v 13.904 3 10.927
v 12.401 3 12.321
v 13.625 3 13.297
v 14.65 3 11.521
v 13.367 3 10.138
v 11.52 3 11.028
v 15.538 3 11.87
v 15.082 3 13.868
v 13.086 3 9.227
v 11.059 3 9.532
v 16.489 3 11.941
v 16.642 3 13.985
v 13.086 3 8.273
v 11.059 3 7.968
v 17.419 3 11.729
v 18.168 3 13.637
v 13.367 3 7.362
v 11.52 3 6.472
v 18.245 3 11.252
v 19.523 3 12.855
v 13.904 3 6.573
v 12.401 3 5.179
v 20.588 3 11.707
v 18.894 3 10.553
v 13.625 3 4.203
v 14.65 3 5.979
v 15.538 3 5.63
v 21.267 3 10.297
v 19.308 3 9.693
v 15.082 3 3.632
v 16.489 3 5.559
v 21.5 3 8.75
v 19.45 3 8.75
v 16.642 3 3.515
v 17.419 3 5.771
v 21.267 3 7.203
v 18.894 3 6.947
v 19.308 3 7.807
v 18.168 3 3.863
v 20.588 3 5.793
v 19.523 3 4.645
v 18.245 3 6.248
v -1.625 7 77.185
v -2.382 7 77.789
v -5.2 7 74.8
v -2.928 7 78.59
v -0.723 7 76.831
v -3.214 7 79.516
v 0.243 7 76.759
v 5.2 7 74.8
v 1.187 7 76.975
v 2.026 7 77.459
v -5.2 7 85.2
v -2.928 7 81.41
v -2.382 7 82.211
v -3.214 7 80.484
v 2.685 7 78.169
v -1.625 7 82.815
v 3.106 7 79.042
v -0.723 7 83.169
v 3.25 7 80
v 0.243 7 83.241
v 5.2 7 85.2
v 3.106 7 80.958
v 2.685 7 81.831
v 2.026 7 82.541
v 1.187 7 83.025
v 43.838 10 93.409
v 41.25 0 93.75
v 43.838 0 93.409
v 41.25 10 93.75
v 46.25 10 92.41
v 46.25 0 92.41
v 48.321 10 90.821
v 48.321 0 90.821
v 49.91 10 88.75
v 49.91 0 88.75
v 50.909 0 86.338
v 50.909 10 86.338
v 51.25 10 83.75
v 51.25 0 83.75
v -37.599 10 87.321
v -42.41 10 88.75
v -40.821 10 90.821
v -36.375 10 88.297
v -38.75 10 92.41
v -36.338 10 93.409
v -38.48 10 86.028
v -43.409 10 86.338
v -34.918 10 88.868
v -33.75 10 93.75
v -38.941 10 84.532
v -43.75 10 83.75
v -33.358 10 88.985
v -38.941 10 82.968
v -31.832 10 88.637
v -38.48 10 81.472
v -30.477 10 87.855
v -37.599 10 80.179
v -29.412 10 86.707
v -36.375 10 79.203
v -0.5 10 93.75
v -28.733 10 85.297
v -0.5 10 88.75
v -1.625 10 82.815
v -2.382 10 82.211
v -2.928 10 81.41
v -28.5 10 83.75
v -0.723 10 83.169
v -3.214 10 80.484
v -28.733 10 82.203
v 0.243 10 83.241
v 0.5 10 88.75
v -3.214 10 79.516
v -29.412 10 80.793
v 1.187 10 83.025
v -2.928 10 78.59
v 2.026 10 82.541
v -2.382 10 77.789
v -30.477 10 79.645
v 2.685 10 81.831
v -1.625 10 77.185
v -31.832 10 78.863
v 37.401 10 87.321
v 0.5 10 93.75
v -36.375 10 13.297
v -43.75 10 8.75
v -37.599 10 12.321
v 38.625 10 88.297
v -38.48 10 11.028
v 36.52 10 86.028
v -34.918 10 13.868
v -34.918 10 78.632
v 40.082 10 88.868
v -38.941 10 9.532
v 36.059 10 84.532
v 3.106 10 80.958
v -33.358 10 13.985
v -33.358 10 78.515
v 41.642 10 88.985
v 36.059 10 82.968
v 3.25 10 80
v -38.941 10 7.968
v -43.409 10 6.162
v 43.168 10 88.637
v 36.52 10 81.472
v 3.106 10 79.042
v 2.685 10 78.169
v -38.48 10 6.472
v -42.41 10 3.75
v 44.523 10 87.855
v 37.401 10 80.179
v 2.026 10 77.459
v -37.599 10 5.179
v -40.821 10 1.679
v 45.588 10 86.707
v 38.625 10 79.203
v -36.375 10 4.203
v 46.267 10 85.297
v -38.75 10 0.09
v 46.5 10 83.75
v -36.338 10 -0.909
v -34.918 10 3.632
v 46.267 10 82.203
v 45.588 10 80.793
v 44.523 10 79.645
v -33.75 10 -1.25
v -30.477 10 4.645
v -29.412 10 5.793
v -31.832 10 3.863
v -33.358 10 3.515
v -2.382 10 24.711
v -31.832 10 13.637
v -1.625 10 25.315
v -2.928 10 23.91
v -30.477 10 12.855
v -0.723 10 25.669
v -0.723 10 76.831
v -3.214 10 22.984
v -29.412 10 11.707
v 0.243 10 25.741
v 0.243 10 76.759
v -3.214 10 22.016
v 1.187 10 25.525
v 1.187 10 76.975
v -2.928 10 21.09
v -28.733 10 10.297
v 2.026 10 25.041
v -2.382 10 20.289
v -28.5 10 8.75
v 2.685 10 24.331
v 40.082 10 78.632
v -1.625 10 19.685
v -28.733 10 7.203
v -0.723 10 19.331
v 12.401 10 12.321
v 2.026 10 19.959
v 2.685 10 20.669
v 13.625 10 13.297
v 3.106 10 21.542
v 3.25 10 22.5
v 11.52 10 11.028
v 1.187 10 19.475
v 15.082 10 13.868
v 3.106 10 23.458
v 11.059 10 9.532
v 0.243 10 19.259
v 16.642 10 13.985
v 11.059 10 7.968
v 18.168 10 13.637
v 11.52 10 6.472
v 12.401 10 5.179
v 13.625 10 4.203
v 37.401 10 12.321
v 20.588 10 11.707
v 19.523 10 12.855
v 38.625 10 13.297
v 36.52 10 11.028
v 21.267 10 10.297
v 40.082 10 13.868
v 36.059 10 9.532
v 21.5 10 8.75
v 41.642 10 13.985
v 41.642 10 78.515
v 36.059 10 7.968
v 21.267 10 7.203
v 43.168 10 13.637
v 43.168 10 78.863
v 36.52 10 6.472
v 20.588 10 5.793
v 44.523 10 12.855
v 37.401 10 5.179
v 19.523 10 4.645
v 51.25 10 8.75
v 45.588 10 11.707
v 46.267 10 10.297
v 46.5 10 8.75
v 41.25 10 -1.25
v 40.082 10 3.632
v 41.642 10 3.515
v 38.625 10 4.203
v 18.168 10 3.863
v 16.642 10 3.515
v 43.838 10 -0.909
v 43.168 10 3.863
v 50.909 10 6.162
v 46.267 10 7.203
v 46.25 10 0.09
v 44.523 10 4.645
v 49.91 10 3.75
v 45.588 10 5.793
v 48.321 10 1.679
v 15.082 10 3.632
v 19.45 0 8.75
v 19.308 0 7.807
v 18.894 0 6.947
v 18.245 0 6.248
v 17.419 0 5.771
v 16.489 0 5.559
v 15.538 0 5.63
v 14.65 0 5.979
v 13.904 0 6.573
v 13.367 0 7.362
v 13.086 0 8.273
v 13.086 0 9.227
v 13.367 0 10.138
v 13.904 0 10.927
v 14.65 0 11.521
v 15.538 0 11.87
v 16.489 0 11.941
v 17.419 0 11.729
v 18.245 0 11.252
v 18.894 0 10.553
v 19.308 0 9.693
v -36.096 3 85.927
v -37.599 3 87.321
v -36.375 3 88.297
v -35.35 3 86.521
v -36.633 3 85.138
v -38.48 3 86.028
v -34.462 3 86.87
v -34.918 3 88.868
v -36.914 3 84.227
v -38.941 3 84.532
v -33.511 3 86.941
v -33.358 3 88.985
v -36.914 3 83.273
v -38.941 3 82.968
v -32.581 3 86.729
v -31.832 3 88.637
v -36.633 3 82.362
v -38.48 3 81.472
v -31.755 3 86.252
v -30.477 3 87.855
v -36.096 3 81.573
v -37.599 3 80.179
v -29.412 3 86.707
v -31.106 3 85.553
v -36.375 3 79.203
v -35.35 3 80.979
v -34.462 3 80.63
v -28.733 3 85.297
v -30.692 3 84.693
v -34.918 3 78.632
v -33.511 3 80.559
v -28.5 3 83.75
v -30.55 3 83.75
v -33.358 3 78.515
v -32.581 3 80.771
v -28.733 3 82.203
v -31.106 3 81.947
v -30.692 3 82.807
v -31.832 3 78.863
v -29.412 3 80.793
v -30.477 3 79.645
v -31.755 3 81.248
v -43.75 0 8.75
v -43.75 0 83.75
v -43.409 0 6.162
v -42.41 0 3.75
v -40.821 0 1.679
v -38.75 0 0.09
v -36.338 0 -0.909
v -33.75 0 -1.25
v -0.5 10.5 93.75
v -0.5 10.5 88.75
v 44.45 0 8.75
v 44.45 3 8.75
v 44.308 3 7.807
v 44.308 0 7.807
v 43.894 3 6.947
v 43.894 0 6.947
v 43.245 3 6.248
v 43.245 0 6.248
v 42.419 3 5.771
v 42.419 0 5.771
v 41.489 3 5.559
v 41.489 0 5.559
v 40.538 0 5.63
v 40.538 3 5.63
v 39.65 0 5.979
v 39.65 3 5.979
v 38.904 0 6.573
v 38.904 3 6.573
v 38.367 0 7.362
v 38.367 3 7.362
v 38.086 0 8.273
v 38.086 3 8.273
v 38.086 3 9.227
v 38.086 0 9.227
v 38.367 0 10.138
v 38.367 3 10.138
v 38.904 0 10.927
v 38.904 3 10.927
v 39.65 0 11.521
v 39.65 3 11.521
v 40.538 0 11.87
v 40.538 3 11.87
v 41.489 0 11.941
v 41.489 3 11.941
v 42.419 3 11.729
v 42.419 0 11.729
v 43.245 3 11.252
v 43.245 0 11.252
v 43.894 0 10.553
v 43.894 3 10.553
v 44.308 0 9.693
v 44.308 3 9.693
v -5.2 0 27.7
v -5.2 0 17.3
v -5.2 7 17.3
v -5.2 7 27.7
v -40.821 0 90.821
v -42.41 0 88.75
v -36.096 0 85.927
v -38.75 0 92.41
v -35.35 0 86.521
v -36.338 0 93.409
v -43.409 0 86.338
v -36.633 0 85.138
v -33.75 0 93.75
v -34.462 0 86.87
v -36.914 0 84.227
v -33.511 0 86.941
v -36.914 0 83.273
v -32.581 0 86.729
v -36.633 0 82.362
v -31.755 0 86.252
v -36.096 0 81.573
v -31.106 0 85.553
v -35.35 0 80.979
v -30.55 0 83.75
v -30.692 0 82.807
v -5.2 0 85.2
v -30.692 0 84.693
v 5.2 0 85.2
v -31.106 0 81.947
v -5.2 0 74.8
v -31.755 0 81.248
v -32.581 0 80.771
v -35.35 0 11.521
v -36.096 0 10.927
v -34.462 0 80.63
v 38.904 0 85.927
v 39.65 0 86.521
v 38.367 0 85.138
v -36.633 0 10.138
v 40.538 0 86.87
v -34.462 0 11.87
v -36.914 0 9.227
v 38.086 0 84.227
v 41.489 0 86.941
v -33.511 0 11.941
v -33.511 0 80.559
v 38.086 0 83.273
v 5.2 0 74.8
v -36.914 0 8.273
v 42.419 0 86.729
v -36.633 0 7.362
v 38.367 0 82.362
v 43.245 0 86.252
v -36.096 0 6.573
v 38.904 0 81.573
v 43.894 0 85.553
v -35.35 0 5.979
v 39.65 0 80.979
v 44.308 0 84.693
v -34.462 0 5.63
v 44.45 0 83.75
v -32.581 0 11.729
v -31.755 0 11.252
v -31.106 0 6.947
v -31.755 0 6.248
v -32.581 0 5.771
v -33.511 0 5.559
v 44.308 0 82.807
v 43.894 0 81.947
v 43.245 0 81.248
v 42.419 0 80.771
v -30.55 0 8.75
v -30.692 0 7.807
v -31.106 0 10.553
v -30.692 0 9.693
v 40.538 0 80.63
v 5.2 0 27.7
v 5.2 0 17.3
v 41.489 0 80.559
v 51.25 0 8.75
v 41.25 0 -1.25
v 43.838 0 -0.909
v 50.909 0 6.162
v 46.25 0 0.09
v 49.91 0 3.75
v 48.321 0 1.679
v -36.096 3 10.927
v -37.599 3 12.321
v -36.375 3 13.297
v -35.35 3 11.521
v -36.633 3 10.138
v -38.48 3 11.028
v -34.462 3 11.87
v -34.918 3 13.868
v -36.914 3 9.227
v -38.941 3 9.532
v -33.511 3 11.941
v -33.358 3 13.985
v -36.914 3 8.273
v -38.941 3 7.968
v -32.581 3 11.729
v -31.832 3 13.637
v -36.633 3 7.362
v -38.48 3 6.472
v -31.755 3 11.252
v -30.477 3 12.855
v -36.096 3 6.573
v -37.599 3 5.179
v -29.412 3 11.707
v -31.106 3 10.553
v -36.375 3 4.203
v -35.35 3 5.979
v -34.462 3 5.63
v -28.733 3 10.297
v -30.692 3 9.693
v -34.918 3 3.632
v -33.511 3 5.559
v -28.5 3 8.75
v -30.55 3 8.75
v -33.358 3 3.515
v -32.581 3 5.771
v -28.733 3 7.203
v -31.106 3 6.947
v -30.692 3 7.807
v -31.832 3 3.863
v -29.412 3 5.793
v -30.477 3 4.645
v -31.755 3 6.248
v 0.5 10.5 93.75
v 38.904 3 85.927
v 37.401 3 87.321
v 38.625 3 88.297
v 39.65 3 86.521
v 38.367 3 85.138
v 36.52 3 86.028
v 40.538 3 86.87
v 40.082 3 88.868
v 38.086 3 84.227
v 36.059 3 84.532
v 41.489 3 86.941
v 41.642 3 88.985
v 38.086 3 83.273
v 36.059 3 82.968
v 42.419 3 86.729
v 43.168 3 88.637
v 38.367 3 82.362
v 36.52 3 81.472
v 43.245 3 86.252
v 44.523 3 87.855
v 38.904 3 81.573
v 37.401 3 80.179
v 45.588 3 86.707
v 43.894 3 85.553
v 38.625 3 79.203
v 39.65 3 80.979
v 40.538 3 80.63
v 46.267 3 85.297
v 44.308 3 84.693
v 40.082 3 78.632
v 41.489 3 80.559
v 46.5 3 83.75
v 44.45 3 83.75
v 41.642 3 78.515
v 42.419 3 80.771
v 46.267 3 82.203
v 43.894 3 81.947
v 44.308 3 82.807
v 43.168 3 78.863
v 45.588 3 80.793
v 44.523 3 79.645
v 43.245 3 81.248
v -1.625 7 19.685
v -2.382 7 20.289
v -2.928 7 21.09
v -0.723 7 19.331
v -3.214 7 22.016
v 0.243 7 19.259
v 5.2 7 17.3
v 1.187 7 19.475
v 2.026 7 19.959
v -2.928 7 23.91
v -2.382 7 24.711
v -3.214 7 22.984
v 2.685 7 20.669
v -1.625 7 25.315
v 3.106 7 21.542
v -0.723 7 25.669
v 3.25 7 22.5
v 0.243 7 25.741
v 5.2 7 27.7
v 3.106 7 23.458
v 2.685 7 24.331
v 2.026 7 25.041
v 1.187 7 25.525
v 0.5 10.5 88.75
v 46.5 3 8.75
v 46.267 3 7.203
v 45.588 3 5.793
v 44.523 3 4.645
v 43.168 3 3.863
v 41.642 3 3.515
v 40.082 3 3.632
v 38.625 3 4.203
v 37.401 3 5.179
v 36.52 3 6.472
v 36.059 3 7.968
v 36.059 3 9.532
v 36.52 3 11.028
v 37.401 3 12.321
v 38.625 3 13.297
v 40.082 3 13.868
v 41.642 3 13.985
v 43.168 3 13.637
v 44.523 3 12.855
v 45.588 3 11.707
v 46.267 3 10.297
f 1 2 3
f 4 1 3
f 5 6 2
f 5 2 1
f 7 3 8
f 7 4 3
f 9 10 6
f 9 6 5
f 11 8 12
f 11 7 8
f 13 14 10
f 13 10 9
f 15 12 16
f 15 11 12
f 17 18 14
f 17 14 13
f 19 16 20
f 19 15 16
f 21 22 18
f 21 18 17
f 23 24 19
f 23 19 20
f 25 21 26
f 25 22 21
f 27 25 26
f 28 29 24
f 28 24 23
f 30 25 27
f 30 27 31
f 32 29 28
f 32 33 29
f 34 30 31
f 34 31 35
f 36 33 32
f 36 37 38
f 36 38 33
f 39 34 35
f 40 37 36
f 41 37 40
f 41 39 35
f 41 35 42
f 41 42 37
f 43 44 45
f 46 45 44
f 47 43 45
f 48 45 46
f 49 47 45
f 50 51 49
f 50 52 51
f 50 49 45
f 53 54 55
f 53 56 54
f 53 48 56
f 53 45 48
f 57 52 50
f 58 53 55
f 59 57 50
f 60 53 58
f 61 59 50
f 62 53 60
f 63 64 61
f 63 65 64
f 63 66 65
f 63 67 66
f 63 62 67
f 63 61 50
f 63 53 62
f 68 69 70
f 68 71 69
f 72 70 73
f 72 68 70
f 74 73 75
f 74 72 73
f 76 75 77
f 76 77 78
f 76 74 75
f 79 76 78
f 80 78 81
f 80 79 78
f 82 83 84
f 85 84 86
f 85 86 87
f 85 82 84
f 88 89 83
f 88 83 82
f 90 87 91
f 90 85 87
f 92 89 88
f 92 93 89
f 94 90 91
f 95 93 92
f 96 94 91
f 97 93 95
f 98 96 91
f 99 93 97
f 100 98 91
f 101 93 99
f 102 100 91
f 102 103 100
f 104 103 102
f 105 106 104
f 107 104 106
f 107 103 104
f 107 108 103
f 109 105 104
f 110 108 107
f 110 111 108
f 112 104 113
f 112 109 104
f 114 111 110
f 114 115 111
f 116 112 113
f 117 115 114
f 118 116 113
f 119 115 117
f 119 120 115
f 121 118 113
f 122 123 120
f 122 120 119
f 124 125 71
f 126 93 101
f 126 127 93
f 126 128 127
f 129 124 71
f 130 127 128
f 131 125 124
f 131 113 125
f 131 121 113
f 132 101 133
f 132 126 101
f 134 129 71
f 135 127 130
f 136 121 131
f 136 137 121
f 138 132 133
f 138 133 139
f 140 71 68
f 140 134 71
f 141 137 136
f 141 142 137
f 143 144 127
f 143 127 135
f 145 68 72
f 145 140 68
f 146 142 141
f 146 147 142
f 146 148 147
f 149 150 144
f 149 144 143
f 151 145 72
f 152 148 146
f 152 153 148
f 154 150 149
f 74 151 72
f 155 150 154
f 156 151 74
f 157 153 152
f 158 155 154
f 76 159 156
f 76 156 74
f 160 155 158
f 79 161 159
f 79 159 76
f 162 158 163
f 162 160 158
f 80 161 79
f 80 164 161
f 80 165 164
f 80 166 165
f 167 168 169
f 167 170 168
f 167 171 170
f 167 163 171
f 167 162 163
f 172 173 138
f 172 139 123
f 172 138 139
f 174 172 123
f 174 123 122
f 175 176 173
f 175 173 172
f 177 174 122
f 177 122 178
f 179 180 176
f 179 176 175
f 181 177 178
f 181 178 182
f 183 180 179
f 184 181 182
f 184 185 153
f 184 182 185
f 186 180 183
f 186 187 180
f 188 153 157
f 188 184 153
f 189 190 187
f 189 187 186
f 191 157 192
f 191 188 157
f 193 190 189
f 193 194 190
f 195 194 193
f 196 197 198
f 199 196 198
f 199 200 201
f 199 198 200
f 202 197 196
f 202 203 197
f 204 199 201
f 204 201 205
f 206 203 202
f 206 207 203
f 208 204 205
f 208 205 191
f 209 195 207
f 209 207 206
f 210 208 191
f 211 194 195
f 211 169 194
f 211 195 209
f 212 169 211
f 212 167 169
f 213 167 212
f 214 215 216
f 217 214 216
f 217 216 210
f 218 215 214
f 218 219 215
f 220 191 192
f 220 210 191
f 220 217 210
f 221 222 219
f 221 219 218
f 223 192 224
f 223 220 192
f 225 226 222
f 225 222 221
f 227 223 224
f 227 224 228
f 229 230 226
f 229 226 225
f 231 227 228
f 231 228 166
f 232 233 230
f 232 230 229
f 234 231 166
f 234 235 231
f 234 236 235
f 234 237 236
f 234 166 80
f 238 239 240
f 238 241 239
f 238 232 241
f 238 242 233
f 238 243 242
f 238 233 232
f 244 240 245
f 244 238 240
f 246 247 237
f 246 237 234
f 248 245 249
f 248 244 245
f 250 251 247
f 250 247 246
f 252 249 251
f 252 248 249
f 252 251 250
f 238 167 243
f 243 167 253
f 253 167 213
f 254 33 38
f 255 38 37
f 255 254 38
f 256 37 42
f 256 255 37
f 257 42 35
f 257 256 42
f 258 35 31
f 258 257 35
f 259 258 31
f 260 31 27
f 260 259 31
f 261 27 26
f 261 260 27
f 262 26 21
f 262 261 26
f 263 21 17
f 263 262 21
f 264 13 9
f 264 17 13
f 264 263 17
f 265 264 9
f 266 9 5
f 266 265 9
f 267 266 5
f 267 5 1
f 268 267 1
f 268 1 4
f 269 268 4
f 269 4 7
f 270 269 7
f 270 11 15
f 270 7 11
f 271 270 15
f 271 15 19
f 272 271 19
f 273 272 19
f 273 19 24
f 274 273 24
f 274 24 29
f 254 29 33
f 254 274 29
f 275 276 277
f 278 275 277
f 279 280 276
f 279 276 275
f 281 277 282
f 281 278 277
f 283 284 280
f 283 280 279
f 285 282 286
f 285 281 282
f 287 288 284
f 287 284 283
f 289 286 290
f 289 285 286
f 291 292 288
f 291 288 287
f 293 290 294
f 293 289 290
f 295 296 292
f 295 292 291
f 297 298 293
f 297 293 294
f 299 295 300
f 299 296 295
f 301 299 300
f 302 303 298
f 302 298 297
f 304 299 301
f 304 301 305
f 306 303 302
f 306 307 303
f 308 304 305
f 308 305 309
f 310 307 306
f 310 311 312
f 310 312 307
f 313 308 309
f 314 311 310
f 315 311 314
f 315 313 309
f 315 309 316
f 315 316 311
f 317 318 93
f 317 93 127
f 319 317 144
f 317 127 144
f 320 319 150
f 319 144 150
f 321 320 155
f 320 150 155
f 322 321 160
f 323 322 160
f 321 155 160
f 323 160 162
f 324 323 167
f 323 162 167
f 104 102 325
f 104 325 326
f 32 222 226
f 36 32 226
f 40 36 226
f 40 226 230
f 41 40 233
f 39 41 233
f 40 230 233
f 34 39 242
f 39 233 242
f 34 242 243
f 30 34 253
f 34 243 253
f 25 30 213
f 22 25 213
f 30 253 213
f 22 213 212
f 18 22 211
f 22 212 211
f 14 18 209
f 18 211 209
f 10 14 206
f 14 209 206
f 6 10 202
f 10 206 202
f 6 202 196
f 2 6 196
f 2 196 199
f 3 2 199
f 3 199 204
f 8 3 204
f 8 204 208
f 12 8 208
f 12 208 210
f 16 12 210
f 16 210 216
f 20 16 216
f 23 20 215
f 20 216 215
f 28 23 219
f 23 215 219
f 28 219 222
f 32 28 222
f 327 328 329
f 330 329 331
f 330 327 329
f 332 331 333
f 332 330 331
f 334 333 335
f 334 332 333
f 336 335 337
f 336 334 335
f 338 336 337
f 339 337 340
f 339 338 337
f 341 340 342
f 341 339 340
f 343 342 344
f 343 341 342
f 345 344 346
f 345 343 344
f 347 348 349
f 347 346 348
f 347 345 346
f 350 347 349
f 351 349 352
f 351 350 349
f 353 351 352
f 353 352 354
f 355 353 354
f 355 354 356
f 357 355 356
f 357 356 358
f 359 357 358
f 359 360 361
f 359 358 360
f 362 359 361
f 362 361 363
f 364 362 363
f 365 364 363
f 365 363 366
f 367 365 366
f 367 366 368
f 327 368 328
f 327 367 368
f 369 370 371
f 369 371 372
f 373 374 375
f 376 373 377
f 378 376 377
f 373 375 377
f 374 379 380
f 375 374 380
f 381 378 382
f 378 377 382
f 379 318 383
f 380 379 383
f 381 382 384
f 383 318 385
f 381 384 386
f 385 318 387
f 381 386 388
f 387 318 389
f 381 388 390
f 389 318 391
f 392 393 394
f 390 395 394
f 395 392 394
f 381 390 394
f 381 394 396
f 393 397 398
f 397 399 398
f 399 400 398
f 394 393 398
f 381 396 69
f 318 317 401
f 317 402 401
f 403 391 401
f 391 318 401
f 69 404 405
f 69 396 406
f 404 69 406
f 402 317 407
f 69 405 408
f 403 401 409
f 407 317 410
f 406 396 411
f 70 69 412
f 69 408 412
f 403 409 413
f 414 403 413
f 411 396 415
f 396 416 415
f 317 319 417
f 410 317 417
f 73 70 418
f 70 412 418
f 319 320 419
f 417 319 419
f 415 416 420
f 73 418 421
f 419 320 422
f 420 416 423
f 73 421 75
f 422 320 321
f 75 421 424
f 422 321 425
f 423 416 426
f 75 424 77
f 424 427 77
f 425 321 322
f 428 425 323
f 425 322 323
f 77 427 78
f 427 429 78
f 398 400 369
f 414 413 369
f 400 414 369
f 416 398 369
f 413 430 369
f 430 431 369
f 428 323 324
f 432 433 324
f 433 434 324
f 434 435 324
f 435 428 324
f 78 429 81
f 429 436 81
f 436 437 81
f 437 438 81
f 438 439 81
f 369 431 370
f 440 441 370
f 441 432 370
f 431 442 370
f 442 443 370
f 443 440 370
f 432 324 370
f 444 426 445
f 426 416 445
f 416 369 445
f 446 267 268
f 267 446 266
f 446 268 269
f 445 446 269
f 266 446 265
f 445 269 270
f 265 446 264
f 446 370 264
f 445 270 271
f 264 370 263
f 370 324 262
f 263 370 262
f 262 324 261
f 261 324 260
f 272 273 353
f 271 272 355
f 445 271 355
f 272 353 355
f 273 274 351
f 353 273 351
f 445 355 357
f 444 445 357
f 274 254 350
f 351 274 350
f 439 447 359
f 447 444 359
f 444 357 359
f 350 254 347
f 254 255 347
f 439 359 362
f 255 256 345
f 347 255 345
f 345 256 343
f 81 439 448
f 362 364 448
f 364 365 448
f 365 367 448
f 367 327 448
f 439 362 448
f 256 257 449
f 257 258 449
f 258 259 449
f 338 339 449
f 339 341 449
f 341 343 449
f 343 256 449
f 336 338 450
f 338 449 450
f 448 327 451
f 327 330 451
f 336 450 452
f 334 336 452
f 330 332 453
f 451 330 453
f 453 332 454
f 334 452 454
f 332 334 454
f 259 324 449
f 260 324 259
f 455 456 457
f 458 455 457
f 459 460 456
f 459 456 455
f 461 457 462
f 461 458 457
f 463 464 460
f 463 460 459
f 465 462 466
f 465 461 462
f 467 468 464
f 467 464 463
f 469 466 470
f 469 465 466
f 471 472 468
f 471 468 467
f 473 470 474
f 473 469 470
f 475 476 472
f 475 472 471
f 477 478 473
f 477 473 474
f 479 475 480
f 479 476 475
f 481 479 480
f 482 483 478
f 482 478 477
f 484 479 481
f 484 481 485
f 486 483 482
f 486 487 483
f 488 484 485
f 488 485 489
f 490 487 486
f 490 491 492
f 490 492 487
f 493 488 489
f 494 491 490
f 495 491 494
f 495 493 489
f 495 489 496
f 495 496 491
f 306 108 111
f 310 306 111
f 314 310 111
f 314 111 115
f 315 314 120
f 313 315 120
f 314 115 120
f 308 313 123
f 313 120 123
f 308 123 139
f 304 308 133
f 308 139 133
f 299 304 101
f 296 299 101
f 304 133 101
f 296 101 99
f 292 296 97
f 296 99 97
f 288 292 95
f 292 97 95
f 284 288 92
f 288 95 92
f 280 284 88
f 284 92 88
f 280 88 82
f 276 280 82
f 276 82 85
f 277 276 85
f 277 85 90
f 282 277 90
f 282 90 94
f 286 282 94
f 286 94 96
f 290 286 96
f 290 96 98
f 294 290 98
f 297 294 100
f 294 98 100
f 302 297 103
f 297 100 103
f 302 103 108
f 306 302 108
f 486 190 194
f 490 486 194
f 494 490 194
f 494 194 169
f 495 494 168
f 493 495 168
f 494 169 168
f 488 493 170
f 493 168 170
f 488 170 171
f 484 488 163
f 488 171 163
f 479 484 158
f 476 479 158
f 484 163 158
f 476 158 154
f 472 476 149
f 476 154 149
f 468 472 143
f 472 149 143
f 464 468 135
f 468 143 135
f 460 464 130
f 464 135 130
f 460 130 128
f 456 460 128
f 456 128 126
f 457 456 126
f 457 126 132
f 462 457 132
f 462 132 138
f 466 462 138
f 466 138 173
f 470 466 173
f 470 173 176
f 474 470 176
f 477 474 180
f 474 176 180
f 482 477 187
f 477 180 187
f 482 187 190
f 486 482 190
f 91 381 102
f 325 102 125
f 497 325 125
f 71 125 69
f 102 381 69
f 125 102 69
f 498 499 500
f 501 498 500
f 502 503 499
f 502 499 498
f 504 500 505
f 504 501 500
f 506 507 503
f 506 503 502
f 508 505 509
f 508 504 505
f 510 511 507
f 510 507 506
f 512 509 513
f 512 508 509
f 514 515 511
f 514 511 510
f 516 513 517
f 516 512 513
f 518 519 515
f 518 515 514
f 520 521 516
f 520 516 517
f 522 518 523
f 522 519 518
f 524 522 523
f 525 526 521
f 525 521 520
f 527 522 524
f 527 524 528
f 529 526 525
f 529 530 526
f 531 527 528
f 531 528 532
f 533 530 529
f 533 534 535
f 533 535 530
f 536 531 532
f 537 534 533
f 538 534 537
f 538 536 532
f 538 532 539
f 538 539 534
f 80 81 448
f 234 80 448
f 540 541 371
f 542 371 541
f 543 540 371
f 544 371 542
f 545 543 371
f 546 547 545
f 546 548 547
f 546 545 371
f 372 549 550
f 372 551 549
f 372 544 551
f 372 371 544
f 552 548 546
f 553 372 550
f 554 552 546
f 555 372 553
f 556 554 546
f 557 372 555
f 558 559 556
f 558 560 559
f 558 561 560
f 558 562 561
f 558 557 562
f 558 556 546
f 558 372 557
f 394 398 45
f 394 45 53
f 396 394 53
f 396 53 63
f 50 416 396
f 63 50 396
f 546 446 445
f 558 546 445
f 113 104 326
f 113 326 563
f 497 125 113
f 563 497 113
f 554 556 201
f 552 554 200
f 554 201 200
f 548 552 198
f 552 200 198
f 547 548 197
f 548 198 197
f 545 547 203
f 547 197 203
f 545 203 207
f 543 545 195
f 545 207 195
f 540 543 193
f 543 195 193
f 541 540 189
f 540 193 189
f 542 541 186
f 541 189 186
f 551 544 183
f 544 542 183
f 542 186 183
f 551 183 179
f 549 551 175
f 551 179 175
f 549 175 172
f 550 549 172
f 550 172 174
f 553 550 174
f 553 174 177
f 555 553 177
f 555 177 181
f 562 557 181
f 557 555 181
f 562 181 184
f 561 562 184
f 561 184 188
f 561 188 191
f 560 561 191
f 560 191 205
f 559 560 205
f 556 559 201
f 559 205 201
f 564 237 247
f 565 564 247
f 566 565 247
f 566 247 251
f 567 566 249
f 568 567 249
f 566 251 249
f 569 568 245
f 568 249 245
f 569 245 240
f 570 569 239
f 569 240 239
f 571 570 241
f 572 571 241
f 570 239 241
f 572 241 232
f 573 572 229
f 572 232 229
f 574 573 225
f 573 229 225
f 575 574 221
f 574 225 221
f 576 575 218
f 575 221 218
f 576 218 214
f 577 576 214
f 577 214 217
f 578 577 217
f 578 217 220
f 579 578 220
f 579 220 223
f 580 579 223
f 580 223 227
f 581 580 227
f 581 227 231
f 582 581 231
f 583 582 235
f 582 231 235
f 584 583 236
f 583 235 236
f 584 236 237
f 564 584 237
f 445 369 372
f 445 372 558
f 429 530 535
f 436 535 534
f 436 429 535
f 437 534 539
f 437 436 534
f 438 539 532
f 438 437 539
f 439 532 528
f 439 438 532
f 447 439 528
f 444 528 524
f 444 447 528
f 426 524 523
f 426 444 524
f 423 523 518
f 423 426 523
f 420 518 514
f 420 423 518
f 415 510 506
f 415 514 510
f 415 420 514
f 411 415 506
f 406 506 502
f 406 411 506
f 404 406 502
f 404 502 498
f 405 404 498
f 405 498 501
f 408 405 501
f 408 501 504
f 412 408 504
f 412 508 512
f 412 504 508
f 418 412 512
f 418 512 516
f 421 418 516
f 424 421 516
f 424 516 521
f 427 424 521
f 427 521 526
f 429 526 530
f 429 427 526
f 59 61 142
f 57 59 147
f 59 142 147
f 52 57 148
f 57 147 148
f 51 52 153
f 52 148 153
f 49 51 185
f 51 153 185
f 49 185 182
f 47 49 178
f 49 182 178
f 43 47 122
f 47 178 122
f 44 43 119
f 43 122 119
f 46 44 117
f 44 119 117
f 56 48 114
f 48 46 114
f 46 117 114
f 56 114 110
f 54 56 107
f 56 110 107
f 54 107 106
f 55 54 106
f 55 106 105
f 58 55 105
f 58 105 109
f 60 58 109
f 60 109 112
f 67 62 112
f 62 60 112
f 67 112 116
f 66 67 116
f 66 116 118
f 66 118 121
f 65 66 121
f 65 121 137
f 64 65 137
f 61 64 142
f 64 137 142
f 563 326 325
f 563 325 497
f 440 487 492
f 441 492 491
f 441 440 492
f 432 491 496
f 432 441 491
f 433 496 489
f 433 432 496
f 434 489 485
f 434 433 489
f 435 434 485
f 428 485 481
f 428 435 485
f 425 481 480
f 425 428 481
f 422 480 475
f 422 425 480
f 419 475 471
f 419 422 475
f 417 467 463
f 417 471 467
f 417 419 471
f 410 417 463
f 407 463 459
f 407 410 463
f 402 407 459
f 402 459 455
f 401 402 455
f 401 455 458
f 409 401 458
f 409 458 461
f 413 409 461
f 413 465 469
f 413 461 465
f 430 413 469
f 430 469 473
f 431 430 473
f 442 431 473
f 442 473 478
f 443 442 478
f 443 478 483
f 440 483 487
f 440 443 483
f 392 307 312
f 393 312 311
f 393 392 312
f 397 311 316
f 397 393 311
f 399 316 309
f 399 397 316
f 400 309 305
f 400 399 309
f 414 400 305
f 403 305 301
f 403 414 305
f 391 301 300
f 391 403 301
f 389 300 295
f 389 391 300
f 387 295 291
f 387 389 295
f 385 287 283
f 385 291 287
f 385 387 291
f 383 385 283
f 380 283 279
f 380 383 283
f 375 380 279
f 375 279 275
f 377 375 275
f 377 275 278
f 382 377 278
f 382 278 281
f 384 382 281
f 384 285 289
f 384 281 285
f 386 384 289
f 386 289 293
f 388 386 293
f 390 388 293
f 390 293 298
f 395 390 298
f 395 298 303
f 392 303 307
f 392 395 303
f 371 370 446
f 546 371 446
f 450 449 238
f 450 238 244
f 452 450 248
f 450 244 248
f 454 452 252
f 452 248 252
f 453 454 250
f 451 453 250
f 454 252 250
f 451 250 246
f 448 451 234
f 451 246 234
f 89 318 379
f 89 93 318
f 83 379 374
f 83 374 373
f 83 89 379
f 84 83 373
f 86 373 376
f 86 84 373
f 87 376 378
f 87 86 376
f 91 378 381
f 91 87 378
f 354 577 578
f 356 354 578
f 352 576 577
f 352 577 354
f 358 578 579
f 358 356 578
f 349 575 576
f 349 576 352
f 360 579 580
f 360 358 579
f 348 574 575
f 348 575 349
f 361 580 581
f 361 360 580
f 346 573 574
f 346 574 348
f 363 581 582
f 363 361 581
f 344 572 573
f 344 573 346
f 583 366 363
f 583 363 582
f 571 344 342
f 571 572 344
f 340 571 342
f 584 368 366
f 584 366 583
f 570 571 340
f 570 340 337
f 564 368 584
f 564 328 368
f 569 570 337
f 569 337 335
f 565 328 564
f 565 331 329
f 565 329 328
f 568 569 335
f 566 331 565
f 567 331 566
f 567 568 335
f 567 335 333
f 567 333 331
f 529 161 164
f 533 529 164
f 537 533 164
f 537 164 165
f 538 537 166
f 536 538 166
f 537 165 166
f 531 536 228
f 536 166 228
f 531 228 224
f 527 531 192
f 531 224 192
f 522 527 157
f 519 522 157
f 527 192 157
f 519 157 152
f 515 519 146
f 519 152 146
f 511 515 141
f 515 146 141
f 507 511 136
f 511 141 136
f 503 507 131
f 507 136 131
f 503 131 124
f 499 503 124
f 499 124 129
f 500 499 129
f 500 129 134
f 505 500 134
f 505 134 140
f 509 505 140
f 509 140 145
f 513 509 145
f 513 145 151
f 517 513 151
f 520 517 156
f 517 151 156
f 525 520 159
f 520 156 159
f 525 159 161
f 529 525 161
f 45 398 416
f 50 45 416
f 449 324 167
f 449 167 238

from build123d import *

# Parameters (mm, degrees)
SKETCH_1_W          = 95
SKETCH_1_H          = 95
SKETCH_1_R          = 3.2
EXTRUDE_1_DEPTH     = 10
SKETCH_2_R          = 5.25
CUT_EXTRUDE_1_DEPTH = 7
FILLET_1_R          = 10
SKETCH_3_R          = 3.25
CUT_EXTRUDE_2_DEPTH = 10
SKETCH_4_W          = 10.4
SKETCH_4_H          = 10.4
SKETCH_4_R          = 3.25
CUT_EXTRUDE_3_DEPTH = 7
SKETCH_5_W          = 1
SKETCH_5_H          = 5
EXTRUDE_2_DEPTH     = 0.5


with BuildPart() as part:
    # 스케치1 → 보스-돌출1 (new body)
    with BuildSketch(Plane(origin=(0, 0, 0), x_dir=(1, 0, 0), z_dir=(0, 1, 0))):
        with Locations((3.75, -46.25)):
            Rectangle(SKETCH_1_W, SKETCH_1_H)
        with Locations((16.25, -8.75)):
            Circle(SKETCH_1_R, mode=Mode.SUBTRACT)
        with Locations((-33.75, -8.75)):
            Circle(SKETCH_1_R, mode=Mode.SUBTRACT)
        with Locations((41.25, -8.75)):
            Circle(SKETCH_1_R, mode=Mode.SUBTRACT)
        with Locations((-33.75, -83.75)):
            Circle(SKETCH_1_R, mode=Mode.SUBTRACT)
        with Locations((41.25, -83.75)):
            Circle(SKETCH_1_R, mode=Mode.SUBTRACT)
    extrude(amount=EXTRUDE_1_DEPTH)

    # 스케치2 → 컷-돌출1 (cut)
    with BuildSketch(Plane(origin=(0, 10, 0), x_dir=(1, 0, 0), z_dir=(0, 1, 0))):
        with Locations((16.25, -8.75)):
            Circle(SKETCH_2_R)
        with Locations((-33.75, -8.75)):
            Circle(SKETCH_2_R)
        with Locations((41.25, -8.75)):
            Circle(SKETCH_2_R)
        with Locations((41.25, -83.75)):
            Circle(SKETCH_2_R)
        with Locations((-33.75, -83.75)):
            Circle(SKETCH_2_R)
    extrude(amount=-CUT_EXTRUDE_1_DEPTH, mode=Mode.SUBTRACT)

    # 필렛1
    fillet_1_edges = [part.edges().sort_by_distance(p)[0] for p in [
        (51.25, 5, -1.25),
        (51.25, 5, 93.75),
        (-43.75, 5, 93.75),
        (-43.75, 5, -1.25),
    ]]
    fillet(fillet_1_edges, radius=FILLET_1_R)

    # 스케치3 → 컷-돌출2 (cut)
    with BuildSketch(Plane(origin=(0, 10, 0), x_dir=(1, 0, 0), z_dir=(0, 1, 0))):
        with Locations((0, -22.5)):
            Circle(SKETCH_3_R)
        with Locations((0, -80)):
            Circle(SKETCH_3_R)
    extrude(amount=-CUT_EXTRUDE_2_DEPTH, mode=Mode.SUBTRACT)

    # 스케치4 → 컷-돌출3 (cut)
    with BuildSketch(Plane.XZ):
        with Locations((0, 22.5)):
            Rectangle(SKETCH_4_W, SKETCH_4_H)
        with Locations((0, 22.5)):
            Circle(SKETCH_4_R, mode=Mode.SUBTRACT)
        with Locations((0, 80)):
            Rectangle(SKETCH_4_W, SKETCH_4_H)
        with Locations((0, 80)):
            Circle(SKETCH_4_R, mode=Mode.SUBTRACT)
    extrude(amount=-CUT_EXTRUDE_3_DEPTH, mode=Mode.SUBTRACT)

    # 스케치5 → 보스-돌출2 (add)
    with BuildSketch(Plane(origin=(0, 10, 0), x_dir=(1, 0, 0), z_dir=(0, 1, 0))):
        with Locations((0, -91.25)):
            Rectangle(SKETCH_5_W, SKETCH_5_H)
    extrude(amount=EXTRUDE_2_DEPTH)


solid = part.part
